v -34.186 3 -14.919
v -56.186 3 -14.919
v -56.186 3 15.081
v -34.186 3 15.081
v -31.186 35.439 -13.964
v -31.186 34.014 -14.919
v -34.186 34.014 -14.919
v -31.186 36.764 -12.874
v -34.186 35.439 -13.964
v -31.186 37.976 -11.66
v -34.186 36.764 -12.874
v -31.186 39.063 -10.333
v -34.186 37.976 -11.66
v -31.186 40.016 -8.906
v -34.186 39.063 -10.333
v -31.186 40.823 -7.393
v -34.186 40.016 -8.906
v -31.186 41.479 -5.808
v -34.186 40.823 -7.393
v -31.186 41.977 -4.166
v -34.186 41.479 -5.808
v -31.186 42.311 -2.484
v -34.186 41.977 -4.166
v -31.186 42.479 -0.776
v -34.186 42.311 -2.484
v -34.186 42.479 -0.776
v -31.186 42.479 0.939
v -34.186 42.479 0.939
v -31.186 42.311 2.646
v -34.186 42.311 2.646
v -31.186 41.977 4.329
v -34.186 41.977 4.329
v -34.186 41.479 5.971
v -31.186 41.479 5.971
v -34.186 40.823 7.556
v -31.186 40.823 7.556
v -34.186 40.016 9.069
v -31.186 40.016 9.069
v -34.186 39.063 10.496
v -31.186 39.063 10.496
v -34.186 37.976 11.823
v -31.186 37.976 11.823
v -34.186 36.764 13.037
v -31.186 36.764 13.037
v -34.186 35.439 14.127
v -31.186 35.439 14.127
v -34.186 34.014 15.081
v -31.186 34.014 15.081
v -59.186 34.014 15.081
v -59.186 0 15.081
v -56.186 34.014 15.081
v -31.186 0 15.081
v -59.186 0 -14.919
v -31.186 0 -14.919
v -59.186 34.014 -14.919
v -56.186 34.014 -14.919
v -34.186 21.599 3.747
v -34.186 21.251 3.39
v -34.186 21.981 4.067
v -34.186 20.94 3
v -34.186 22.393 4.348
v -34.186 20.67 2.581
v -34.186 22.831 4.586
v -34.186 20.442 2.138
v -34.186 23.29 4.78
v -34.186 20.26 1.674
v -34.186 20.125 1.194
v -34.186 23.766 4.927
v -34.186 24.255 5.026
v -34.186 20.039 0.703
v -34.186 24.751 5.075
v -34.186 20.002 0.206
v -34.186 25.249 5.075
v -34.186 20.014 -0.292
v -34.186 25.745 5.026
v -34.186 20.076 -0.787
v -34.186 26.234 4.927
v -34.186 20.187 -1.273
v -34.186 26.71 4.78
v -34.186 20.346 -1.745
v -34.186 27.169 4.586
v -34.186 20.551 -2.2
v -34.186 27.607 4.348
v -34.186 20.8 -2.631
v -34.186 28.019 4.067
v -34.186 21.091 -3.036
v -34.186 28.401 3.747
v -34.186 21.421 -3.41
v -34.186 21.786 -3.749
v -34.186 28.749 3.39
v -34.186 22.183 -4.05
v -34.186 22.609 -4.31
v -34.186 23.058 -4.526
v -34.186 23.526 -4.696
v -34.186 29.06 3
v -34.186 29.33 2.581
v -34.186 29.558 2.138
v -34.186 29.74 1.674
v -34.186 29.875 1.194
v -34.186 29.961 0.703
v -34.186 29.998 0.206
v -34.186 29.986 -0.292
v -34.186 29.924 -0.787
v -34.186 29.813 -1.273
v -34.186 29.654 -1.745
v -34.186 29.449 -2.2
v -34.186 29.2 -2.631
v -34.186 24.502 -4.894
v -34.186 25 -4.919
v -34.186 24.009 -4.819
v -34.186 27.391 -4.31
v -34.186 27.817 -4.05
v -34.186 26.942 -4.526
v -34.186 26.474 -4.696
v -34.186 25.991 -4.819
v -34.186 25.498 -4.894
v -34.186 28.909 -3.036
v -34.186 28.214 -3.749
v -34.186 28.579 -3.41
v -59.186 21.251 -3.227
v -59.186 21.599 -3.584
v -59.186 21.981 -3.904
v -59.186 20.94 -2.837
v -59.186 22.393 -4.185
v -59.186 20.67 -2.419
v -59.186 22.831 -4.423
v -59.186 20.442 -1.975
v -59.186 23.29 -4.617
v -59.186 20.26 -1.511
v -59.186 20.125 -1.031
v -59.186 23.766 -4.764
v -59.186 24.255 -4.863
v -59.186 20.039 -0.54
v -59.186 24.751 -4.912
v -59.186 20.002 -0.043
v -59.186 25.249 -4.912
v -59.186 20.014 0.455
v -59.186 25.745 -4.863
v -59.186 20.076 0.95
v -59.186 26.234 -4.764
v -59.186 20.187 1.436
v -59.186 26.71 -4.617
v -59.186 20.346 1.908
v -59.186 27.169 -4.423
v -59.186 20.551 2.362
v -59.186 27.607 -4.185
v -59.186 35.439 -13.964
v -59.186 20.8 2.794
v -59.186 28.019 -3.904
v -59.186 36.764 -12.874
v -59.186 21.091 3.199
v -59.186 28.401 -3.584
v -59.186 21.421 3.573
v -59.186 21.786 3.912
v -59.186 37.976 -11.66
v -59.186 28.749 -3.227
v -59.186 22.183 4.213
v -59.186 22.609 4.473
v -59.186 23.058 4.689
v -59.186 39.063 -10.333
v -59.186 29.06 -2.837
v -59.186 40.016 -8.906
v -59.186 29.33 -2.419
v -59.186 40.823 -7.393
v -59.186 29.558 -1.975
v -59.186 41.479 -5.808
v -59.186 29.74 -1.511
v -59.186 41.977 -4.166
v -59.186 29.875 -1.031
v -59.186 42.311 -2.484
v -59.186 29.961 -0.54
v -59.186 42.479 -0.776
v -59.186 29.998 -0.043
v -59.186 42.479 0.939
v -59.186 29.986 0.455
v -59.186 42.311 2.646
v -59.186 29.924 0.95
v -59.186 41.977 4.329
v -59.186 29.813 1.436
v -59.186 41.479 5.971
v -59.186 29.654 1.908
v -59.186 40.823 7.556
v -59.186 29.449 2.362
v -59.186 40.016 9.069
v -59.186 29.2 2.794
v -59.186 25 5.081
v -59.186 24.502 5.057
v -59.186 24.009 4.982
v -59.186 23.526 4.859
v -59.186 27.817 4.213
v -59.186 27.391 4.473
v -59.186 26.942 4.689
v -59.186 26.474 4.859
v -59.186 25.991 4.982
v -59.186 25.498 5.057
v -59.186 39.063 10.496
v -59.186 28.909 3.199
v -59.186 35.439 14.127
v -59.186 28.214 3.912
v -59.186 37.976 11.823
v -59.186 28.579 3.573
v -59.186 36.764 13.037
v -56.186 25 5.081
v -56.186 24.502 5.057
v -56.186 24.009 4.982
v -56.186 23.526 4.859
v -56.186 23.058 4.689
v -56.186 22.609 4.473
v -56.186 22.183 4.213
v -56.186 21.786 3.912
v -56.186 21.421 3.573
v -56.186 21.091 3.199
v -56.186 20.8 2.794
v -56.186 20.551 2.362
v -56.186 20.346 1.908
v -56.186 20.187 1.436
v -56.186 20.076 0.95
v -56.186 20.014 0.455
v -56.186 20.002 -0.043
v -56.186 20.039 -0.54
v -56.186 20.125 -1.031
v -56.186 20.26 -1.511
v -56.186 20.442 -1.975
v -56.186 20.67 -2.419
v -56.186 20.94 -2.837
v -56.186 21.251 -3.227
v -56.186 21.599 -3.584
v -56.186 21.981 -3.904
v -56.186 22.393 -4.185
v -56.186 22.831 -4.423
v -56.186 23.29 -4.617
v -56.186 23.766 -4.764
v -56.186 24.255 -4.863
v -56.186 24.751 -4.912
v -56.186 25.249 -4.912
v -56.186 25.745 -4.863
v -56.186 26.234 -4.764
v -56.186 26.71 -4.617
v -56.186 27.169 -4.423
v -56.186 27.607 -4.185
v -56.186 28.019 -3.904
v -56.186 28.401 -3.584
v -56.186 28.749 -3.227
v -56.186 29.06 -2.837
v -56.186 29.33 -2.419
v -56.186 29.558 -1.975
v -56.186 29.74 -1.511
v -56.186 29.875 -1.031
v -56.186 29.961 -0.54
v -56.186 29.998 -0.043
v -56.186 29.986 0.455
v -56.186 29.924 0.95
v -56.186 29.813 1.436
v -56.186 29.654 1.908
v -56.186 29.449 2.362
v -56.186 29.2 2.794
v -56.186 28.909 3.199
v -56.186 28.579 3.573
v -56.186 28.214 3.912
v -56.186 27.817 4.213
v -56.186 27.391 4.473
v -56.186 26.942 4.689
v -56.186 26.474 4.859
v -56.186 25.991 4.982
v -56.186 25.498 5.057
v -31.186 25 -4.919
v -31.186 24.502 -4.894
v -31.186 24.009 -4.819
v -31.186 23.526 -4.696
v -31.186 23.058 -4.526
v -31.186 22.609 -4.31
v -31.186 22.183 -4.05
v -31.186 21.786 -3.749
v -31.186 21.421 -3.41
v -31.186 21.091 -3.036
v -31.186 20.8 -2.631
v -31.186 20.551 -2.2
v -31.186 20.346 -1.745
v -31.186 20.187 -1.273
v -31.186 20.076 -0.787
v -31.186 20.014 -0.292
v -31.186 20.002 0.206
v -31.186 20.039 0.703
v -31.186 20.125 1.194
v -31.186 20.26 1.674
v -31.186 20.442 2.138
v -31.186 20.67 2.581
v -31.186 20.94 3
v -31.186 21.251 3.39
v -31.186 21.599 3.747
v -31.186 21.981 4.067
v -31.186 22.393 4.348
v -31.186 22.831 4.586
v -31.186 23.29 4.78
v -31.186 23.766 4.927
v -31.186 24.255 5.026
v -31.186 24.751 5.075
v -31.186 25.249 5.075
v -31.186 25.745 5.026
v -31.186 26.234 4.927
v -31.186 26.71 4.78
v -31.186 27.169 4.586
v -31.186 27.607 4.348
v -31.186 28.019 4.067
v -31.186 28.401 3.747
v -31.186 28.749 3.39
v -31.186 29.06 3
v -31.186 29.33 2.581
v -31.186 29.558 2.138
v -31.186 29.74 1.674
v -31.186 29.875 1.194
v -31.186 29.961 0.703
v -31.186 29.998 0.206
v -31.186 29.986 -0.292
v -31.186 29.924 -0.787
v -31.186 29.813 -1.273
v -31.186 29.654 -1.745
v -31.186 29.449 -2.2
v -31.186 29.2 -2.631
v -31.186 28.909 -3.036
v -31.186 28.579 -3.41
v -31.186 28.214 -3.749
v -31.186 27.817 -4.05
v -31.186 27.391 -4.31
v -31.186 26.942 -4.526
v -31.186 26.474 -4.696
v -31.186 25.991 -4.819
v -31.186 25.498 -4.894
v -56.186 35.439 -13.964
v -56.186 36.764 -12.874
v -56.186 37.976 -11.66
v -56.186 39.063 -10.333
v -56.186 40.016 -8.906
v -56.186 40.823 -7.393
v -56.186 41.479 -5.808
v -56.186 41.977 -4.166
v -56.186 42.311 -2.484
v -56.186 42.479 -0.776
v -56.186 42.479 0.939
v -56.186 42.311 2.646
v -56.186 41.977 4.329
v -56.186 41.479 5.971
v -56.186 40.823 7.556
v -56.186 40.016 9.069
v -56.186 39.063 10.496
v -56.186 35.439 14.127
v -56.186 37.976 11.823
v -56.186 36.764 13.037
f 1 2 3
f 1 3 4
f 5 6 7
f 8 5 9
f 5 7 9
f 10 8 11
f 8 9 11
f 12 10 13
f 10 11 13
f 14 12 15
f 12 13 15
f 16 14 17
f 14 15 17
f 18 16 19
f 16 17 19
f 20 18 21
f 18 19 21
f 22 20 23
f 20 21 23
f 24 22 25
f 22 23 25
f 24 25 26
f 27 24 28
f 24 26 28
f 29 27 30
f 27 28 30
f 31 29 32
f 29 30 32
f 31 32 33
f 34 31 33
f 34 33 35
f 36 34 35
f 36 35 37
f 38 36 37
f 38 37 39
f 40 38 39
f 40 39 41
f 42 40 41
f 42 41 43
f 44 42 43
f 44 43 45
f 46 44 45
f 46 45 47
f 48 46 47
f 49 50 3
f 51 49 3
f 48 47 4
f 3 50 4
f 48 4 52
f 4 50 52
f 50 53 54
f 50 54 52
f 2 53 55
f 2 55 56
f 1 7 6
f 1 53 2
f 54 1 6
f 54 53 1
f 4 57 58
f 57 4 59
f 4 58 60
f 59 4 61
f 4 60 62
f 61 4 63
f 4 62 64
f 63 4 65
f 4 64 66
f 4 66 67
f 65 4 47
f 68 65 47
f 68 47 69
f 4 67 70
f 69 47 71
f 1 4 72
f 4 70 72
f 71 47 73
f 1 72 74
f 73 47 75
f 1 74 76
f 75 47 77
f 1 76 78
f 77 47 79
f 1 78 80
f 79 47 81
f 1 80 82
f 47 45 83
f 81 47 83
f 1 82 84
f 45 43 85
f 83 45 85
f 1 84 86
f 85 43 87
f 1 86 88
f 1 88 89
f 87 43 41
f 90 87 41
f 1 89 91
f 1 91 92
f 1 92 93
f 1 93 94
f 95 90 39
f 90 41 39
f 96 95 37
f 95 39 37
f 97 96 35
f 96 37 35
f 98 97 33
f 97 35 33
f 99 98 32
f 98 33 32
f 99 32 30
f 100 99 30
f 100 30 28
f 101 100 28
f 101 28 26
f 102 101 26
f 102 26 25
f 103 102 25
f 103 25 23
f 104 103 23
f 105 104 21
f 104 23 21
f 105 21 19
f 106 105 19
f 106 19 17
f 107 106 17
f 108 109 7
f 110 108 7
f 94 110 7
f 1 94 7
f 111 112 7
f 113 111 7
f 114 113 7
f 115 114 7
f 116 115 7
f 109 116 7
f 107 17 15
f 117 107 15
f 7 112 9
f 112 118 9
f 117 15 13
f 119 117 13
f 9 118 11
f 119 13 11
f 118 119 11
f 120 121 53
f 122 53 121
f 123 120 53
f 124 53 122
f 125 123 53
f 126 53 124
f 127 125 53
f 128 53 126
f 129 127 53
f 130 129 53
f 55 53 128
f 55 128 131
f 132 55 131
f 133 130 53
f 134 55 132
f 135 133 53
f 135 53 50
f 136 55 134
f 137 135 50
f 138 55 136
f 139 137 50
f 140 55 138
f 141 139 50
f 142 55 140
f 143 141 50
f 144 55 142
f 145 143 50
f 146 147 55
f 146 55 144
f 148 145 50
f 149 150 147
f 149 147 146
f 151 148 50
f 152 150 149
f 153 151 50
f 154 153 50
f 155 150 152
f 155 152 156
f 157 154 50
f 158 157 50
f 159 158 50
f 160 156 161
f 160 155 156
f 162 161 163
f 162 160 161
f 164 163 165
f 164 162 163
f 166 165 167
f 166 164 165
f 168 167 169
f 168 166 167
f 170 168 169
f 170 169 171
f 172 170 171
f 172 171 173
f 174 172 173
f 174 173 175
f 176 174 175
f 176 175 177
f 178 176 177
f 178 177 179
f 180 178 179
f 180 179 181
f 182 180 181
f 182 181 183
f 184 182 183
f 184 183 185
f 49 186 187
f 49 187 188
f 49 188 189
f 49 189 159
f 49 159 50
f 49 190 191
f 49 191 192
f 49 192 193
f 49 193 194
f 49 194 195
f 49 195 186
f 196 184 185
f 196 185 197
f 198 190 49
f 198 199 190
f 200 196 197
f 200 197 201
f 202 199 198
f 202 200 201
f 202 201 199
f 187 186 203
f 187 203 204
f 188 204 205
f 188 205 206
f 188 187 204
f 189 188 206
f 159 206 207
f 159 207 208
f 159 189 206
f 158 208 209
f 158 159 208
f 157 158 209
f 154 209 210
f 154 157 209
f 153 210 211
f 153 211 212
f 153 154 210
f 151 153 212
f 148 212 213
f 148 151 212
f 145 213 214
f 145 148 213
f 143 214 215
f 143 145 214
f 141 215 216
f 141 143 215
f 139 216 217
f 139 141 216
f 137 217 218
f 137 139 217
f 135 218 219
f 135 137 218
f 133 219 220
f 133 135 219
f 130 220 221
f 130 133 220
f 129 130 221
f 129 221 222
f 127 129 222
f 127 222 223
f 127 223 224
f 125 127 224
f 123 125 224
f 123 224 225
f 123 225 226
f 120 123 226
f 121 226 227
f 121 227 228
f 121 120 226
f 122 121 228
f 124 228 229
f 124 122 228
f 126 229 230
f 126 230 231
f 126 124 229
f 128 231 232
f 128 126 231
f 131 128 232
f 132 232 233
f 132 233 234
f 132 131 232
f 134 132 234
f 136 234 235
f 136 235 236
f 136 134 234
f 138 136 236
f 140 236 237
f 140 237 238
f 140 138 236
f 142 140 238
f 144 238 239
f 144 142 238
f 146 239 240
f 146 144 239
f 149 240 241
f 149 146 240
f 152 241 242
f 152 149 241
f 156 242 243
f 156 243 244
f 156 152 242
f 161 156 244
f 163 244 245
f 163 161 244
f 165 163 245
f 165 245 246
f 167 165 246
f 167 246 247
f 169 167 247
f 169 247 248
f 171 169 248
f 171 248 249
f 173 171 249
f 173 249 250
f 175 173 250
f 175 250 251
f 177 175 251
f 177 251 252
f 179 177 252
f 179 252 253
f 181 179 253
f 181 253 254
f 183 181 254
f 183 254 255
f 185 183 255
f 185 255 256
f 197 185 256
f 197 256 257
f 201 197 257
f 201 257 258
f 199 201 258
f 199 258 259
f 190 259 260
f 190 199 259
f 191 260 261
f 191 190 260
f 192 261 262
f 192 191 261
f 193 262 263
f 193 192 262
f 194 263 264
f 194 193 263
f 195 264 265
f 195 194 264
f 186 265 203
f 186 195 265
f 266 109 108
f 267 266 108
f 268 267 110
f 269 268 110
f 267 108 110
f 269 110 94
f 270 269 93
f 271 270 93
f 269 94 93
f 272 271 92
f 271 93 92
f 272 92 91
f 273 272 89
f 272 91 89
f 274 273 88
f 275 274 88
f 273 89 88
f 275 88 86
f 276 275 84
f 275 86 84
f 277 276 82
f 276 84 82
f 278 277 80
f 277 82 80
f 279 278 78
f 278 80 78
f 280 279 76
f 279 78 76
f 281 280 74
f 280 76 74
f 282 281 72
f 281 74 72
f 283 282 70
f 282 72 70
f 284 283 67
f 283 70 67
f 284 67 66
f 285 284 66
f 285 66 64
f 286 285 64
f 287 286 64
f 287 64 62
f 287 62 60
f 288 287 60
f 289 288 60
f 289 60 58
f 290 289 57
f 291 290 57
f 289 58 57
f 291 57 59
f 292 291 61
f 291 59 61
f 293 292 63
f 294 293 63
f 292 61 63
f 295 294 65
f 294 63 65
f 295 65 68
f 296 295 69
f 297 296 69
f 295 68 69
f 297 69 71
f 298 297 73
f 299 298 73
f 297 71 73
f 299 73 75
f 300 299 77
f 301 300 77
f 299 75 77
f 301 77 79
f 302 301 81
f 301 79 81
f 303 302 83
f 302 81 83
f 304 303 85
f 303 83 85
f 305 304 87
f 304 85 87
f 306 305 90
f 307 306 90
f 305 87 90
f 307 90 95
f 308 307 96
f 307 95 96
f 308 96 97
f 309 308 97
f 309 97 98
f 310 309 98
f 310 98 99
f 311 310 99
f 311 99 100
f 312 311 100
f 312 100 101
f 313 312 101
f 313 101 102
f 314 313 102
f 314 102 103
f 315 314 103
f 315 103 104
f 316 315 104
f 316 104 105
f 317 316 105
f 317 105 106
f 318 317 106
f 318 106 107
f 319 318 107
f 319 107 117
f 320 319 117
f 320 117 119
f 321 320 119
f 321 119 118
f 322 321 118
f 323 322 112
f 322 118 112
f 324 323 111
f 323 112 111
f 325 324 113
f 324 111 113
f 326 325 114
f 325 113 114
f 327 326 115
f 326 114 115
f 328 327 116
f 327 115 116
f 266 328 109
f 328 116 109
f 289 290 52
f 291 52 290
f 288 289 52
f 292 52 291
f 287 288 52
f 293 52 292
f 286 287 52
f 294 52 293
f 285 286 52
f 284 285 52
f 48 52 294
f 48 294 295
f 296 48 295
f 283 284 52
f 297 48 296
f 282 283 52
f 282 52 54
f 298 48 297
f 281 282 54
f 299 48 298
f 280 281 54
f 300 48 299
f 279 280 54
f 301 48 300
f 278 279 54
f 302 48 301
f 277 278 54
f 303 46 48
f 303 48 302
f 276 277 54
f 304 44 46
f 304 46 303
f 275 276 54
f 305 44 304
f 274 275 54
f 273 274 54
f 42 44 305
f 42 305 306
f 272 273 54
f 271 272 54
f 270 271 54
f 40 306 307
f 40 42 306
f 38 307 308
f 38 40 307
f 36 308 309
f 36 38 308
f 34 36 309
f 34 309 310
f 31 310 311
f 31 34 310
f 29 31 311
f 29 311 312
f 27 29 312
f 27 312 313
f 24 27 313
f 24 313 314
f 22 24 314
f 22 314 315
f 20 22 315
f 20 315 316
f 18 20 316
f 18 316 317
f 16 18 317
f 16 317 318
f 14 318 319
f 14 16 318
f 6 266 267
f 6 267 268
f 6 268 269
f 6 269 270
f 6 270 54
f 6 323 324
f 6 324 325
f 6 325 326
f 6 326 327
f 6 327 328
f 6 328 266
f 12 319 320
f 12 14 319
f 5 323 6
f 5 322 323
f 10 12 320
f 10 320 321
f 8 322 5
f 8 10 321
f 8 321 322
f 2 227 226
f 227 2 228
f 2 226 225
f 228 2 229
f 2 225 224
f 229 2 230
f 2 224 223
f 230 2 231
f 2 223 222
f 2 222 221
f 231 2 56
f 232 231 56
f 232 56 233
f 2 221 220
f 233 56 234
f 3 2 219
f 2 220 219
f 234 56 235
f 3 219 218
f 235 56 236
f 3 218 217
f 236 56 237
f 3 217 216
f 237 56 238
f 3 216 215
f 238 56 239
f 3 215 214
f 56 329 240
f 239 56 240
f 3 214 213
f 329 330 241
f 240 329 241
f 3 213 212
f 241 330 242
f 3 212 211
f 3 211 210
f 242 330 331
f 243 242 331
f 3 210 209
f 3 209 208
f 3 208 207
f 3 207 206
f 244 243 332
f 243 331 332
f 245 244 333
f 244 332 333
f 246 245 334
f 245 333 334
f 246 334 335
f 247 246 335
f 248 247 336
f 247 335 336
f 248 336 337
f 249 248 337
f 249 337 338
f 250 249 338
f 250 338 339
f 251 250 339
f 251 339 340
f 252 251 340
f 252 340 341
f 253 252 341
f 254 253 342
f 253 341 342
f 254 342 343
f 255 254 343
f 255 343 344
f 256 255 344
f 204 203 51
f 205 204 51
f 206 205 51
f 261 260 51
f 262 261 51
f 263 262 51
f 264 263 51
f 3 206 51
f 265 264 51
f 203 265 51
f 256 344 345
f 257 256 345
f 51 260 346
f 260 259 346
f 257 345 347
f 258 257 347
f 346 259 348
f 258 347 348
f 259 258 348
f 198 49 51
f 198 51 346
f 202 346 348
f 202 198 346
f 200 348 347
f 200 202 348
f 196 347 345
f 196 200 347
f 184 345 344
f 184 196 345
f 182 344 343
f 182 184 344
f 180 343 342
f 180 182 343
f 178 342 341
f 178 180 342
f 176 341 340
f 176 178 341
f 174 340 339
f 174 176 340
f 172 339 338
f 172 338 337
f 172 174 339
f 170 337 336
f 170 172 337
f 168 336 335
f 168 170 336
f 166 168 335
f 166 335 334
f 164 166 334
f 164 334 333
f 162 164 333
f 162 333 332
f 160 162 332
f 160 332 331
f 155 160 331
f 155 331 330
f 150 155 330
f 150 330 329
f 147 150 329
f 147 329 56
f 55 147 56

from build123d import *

# Parameters (mm, degrees)
SKETCH1_W           = 22
SKETCH1_H           = 35
BOSS_EXTRUDE1_DEPTH = 3
SKETCH2_W           = 35
SKETCH2_H           = 3
BOSS_EXTRUDE6_DEPTH = 3
BOSS_EXTRUDE7_START = 3
SKETCH4_W           = 35
SKETCH4_H           = 3
BOSS_EXTRUDE7_DEPTH = 3
SKETCH5_W           = 28
SKETCH5_H           = 2.5
CUT_EXTRUDE1_DEPTH  = 50


with BuildPart() as part:
    # Sketch1 → Boss-Extrude1 (new body)
    with BuildSketch(Plane(origin=(0, 0, 0), x_dir=(1, 0, 0), z_dir=(0, 1, 0))):
        with Locations((-45.186046512, -0.081395349)):
            Rectangle(SKETCH1_W, SKETCH1_H)
    extrude(amount=BOSS_EXTRUDE1_DEPTH)

    # Sketch2 → Boss-Extrude6 (add)
    with BuildSketch(Plane(origin=(-34.186046512, 0, 0), x_dir=(0, 0, -1), z_dir=(1, 0, 0))):
        with BuildLine():
            ThreePointArc((17.418604651, 25), (-0.081395349, 42.5), (-17.581395349, 25))
            Line((-17.581395349, 25), (-5.081395349, 25))
            ThreePointArc((-5.081395349, 25), (-0.081395349, 30), (4.918604651, 25))
            Line((4.918604651, 25), (17.418604651, 25))
        make_face()
        with BuildLine():
            Line((-5.081395349, 25), (-17.581395349, 25))
            ThreePointArc((-17.581395349, 25), (-0.081395349, 7.5), (17.418604651, 25))
            Line((17.418604651, 25), (4.918604651, 25))
            ThreePointArc((4.918604651, 25), (-0.081395349, 20), (-5.081395349, 25))
        make_face()
        with BuildLine():
            Line((-17.581395349, 25), (-17.581395349, 3))
            Line((-17.581395349, 3), (17.418604651, 3))
            Line((17.418604651, 3), (17.418604651, 25))
            ThreePointArc((17.418604651, 25), (-0.081395349, 7.5), (-17.581395349, 25))
        make_face()
        with Locations((-0.081395349, 1.5)):
            Rectangle(SKETCH2_W, SKETCH2_H)
    extrude(amount=BOSS_EXTRUDE6_DEPTH)

    # Sketch4 → Boss-Extrude7 (add)
    with BuildSketch(Plane.ZY.offset(56.186046512).offset(BOSS_EXTRUDE7_START)):
        with BuildLine():
            ThreePointArc((17.581395349, 25), (0.081395349, 42.5), (-17.418604651, 25))
            Line((-17.418604651, 25), (-4.918604651, 25))
            ThreePointArc((-4.918604651, 25), (0.081395349, 30), (5.081395349, 25))
            Line((5.081395349, 25), (17.581395349, 25))
        make_face()
        with BuildLine():
            Line((-4.918604651, 25), (-17.418604651, 25))
            ThreePointArc((-17.418604651, 25), (0.081395349, 7.5), (17.581395349, 25))
            Line((17.581395349, 25), (5.081395349, 25))
            ThreePointArc((5.081395349, 25), (0.081395349, 20), (-4.918604651, 25))
        make_face()
        with BuildLine():
            Line((-17.418604651, 25), (-17.418604651, 3))
            Line((-17.418604651, 3), (17.581395349, 3))
            Line((17.581395349, 3), (17.581395349, 25))
            ThreePointArc((17.581395349, 25), (0.081395349, 7.5), (-17.418604651, 25))
        make_face()
        with Locations((0.081395349, 1.5)):
            Rectangle(SKETCH4_W, SKETCH4_H)
    extrude(amount=-BOSS_EXTRUDE7_DEPTH)

    # Sketch5 → Cut-Extrude1 (cut)
    with BuildSketch(Plane.XZ):
        with Locations((-45.186046512, 16.331395349)):
            Rectangle(SKETCH5_W, SKETCH5_H)
        with Locations((-45.186046512, -16.168604651)):
            Rectangle(SKETCH5_W, SKETCH5_H)
    extrude(amount=-CUT_EXTRUDE1_DEPTH, mode=Mode.SUBTRACT)


solid = part.part
